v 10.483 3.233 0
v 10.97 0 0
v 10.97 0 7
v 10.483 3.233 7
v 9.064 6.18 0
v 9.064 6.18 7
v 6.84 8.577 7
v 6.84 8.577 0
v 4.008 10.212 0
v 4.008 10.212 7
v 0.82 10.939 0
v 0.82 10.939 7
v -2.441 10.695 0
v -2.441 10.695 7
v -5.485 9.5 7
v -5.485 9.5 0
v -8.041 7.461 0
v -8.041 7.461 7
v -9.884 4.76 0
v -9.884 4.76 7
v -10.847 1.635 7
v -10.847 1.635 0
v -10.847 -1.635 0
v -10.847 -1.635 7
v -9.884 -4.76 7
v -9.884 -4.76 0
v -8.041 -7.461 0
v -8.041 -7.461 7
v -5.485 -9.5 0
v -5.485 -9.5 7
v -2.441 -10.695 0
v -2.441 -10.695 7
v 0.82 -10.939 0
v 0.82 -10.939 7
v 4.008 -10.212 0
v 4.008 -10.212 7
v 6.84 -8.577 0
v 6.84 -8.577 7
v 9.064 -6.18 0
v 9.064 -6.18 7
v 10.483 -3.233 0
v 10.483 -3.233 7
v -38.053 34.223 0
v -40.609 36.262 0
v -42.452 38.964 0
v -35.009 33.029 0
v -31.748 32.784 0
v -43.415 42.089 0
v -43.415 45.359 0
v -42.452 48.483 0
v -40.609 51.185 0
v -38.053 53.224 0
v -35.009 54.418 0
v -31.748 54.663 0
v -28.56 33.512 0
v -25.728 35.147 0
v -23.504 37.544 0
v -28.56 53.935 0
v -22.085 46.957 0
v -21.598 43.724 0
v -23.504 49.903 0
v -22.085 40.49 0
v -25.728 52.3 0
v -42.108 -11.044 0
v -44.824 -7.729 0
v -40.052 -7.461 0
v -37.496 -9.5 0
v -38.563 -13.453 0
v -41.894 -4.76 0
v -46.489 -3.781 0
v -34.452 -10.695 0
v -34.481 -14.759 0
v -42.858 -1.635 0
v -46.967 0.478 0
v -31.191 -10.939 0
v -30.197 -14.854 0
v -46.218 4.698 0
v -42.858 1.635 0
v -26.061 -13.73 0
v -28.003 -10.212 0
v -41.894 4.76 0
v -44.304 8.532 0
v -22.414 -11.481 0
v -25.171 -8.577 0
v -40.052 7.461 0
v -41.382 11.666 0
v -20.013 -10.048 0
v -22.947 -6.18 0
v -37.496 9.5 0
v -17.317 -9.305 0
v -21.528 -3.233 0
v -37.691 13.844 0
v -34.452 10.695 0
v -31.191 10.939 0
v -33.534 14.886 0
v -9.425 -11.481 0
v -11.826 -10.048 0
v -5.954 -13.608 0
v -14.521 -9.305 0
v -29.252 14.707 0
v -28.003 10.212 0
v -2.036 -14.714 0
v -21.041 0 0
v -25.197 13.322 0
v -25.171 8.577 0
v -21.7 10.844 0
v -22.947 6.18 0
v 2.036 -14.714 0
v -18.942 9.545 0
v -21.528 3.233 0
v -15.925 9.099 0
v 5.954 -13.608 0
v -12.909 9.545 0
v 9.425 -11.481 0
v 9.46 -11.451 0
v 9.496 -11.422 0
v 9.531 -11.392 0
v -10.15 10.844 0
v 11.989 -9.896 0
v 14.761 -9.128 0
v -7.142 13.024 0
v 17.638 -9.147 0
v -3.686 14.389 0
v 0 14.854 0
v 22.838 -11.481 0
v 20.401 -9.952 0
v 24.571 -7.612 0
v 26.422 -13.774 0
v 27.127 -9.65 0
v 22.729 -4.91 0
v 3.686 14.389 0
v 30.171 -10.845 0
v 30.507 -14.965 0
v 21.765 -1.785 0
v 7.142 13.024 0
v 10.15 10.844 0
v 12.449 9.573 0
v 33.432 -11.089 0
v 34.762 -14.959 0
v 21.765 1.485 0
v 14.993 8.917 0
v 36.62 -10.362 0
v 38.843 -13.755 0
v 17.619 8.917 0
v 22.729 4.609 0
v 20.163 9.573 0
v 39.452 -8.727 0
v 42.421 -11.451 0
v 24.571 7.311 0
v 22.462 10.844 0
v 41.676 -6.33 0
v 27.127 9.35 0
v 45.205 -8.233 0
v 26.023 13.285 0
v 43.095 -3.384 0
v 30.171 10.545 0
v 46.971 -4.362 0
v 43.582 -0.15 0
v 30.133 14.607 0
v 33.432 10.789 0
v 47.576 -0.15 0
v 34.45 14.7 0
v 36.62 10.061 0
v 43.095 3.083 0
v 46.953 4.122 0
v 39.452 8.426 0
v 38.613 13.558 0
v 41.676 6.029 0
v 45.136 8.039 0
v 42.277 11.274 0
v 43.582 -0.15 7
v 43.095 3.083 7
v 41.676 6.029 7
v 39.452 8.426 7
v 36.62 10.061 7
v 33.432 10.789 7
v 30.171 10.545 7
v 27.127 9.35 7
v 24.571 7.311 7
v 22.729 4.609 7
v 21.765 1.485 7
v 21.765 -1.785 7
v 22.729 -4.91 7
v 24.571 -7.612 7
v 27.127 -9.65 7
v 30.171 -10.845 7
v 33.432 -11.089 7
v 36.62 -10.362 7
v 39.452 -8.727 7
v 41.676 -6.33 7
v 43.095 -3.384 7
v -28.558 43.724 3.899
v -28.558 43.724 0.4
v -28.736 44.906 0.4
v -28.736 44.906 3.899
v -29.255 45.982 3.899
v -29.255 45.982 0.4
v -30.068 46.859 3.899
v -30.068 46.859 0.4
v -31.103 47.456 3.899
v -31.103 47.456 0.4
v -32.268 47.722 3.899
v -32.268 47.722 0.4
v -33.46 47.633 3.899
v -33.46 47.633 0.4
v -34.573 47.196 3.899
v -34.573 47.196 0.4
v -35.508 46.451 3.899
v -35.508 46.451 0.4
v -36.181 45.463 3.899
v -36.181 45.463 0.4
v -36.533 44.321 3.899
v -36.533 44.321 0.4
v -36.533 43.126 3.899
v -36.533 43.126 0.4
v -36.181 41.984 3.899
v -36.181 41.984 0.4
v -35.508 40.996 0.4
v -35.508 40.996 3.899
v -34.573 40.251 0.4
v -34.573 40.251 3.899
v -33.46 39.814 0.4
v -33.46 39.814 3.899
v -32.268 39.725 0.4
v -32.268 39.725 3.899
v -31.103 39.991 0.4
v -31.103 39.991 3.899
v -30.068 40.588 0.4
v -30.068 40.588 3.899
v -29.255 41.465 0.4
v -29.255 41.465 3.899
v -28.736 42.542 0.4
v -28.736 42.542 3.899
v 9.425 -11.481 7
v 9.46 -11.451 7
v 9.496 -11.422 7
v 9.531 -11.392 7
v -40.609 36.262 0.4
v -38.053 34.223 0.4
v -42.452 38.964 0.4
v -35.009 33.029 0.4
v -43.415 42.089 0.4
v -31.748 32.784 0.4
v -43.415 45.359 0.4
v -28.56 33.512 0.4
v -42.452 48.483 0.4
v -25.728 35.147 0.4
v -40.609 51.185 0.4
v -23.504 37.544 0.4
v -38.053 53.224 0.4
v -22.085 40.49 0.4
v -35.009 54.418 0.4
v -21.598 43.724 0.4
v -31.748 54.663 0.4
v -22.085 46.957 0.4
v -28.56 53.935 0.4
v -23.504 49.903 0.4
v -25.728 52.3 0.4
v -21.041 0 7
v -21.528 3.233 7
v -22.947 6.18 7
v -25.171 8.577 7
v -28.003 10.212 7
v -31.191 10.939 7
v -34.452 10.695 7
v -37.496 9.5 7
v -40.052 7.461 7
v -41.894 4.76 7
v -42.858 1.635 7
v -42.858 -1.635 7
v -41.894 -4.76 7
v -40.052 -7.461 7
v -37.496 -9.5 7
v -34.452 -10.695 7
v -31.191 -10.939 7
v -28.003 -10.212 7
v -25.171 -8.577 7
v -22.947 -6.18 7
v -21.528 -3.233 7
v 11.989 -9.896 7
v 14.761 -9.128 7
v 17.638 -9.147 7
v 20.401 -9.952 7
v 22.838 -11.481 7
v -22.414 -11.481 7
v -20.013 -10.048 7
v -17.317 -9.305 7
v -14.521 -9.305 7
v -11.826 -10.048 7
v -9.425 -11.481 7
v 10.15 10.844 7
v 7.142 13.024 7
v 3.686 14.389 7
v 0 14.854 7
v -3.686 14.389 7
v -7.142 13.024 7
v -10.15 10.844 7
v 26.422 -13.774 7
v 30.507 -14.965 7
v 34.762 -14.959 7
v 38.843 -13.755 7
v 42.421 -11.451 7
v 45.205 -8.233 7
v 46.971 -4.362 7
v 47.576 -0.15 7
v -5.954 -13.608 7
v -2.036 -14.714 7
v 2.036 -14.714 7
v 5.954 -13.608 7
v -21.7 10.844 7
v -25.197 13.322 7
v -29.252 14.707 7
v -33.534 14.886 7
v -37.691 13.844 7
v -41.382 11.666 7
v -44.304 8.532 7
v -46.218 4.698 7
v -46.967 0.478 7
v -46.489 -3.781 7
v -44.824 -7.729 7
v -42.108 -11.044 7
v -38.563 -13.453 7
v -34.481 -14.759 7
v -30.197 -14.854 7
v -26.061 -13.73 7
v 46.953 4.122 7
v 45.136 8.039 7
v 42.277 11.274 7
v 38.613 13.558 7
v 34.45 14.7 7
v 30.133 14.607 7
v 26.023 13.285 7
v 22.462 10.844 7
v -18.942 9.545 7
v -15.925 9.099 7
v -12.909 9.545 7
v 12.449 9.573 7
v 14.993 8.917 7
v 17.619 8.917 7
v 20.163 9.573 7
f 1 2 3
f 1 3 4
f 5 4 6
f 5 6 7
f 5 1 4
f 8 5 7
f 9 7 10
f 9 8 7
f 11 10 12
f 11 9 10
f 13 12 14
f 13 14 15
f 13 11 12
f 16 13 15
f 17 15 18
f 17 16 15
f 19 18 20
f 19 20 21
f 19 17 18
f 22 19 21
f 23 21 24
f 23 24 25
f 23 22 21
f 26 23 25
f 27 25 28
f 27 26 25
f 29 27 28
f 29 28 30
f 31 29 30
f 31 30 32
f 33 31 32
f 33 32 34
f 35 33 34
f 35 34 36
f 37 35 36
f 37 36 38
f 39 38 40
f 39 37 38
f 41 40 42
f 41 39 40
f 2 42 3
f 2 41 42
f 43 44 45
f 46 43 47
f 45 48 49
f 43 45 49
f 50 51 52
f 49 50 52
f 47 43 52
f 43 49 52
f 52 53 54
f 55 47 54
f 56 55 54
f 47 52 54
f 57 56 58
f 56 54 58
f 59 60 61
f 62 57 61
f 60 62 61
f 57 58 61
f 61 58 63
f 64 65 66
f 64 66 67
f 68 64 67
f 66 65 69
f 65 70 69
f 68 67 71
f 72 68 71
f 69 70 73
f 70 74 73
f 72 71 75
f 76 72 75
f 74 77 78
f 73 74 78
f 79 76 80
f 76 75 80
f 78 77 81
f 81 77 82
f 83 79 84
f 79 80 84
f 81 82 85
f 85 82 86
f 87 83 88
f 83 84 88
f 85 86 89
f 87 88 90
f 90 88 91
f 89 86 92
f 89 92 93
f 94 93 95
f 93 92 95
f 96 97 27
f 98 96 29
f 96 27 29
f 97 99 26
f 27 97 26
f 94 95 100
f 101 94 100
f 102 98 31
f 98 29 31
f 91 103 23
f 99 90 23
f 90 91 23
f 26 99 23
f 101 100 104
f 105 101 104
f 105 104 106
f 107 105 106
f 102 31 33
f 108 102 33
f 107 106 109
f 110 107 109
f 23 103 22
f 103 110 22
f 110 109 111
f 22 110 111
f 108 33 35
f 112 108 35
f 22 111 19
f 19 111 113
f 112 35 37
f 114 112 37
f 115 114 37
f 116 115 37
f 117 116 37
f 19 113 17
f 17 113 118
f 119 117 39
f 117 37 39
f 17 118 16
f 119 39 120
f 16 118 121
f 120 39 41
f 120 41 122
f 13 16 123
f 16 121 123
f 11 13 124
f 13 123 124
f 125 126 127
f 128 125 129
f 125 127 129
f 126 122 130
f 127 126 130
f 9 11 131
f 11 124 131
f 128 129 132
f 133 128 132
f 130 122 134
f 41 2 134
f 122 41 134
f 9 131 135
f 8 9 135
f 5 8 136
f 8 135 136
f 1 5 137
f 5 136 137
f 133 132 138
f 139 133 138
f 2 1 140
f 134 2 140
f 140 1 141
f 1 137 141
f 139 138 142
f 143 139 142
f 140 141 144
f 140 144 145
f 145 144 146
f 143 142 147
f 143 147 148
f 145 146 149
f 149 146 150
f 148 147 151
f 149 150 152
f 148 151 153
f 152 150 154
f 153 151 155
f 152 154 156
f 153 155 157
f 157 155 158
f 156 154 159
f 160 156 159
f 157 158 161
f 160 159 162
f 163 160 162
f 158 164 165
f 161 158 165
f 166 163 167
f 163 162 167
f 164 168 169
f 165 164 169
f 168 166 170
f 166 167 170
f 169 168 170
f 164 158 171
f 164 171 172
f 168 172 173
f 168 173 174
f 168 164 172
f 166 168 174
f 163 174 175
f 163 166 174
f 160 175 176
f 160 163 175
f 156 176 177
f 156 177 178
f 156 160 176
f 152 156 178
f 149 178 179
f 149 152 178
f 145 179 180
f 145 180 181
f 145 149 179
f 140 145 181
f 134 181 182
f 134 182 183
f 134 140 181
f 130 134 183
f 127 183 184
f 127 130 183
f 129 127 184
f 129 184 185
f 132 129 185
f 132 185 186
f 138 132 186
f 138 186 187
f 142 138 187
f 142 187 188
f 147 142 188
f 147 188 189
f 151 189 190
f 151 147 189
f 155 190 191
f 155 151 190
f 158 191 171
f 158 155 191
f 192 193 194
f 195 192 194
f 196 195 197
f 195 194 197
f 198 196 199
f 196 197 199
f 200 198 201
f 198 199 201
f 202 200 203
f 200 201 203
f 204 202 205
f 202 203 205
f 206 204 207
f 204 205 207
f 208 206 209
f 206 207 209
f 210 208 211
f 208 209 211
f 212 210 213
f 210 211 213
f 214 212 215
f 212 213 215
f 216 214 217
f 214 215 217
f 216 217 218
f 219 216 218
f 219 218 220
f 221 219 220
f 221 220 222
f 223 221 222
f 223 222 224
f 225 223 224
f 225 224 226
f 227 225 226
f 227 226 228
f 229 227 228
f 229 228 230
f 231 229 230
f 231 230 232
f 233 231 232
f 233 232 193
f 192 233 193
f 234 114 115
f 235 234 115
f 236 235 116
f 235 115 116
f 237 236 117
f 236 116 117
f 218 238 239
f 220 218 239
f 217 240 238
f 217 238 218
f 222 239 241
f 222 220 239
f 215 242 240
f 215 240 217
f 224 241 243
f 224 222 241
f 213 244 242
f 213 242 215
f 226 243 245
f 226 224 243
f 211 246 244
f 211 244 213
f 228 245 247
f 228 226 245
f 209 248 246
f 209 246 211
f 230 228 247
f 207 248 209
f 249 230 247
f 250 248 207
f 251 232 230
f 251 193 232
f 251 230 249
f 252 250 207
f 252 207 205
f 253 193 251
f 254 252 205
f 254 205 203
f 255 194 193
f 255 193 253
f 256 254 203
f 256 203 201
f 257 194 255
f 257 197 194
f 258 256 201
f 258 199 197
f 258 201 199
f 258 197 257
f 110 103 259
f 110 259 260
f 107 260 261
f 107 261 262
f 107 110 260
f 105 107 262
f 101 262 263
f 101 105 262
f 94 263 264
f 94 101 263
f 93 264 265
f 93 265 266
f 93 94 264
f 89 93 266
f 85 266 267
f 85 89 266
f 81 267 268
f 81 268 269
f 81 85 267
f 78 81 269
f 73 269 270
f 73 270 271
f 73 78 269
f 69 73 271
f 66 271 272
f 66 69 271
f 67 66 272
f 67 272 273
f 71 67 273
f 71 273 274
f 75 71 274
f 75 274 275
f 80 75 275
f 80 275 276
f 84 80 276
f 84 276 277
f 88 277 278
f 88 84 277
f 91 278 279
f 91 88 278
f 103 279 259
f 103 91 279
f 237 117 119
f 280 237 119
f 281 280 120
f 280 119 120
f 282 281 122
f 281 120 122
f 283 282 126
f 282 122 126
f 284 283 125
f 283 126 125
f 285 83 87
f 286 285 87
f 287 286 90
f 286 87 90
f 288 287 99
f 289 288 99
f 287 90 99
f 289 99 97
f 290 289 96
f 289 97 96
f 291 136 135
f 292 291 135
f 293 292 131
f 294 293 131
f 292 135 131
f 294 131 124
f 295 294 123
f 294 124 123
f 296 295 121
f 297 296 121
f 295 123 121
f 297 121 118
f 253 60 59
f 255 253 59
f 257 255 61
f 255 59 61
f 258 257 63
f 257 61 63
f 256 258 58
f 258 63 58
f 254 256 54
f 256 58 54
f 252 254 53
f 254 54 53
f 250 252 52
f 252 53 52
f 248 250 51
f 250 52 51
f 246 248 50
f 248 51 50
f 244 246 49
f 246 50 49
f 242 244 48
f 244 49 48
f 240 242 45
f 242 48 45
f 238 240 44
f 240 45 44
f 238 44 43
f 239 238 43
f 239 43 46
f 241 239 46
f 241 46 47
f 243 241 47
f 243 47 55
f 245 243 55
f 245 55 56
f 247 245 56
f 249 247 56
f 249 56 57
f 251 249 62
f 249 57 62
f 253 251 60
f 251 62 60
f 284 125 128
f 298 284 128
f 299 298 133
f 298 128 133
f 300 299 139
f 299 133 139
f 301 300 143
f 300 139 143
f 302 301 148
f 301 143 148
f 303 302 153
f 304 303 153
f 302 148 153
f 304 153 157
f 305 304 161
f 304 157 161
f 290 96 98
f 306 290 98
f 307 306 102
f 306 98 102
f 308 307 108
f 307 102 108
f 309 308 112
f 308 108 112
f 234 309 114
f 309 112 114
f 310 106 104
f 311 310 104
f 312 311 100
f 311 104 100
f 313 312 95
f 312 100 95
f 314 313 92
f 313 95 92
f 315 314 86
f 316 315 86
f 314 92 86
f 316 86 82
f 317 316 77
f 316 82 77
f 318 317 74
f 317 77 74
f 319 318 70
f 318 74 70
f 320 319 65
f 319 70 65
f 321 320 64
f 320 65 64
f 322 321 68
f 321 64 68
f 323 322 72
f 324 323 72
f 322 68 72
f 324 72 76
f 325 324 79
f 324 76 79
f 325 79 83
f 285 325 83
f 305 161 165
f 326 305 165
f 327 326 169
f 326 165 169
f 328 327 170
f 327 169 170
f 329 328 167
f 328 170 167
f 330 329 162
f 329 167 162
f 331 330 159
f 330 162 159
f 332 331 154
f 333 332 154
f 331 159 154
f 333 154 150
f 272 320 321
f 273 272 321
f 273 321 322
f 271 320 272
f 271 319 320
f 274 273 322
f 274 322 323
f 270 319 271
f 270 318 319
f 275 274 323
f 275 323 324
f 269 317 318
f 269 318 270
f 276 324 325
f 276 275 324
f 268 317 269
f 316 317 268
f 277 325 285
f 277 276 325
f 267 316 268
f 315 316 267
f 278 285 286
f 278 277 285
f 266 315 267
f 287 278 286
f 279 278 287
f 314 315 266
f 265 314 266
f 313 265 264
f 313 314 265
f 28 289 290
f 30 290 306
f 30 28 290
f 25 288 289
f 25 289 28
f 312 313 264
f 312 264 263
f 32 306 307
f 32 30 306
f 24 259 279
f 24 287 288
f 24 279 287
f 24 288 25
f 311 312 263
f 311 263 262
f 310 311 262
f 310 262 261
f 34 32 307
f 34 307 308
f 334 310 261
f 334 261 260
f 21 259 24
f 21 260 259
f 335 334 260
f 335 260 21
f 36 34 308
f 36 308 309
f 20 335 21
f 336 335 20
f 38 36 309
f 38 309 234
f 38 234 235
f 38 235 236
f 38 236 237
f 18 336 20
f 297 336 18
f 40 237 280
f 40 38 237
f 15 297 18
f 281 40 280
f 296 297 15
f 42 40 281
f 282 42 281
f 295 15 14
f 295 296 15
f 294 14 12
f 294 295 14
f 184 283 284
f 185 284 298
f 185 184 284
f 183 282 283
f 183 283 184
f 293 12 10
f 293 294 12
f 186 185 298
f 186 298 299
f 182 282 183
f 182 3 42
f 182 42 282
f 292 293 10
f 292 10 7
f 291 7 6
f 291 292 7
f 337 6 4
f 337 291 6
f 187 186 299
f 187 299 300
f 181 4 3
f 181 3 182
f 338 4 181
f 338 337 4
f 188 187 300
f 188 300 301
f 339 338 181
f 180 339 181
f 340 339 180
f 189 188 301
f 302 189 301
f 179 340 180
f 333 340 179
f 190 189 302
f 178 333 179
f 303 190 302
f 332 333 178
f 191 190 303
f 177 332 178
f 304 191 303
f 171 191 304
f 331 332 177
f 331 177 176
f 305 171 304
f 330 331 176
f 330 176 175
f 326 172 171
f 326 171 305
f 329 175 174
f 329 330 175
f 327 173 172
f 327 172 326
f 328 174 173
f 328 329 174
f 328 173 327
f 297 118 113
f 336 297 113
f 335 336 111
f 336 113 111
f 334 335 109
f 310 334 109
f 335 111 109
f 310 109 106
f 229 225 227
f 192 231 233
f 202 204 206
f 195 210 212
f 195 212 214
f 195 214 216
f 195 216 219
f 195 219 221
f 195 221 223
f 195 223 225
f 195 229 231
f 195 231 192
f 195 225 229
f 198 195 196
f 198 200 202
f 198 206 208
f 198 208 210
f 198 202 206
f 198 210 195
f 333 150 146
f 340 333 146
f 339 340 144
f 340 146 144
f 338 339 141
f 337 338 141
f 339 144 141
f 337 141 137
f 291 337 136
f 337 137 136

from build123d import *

# Parameters (mm, degrees)
F0_R     = 10.969873
F1_DEPTH = 7
F2_R     = 10.969873
F2_R_2   = 4.009944
F3_DEPTH = 0.4
F4_DEPTH = 3.899


with BuildPart() as f1:
    # F0 (on Top) → F1 (new body)
    with BuildSketch(Plane.XY):
        with BuildLine():
            ThreePointArc((9.531212, -11.392412), (13.457422, -6.287198), (14.853655, 0))
            ThreePointArc((14.853655, 0), (13.62721, 5.910178), (10.150407, 10.844367))
            ThreePointArc((10.150407, 10.844367), (0, 14.853655), (-10.150407, 10.844367))
            ThreePointArc((-10.150407, 10.844367), (-14.845811, -0.482663), (-9.424578, -11.480783))
            ThreePointArc((-9.424578, -11.480783), (0, -14.853655), (9.424578, -11.480783))
            ThreePointArc((9.424578, -11.480783), (9.477749, -11.436421), (9.531212, -11.392412))
        make_face()
        Circle(F0_R, mode=Mode.SUBTRACT)
        with BuildLine():
            ThreePointArc((10.150407, 10.844367), (13.62721, 5.910178), (14.853655, 0))
            ThreePointArc((14.853655, 0), (13.457422, -6.287198), (9.531212, -11.392412))
            ThreePointArc((9.531212, -11.392412), (16.20044, -9.038003), (22.83781, -11.480783))
            ThreePointArc((22.83781, -11.480783), (17.650377, -0.402473), (22.461509, 10.844367))
            ThreePointArc((22.461509, 10.844367), (16.305958, 8.833536), (10.150407, 10.844367))
        make_face()
        with BuildLine():
            ThreePointArc((9.424578, -11.480783), (9.477998, -11.436722), (9.531212, -11.392412))
            ThreePointArc((9.531212, -11.392412), (9.477749, -11.436421), (9.424578, -11.480783))
        make_face()
        with BuildLine():
            ThreePointArc((-9.424578, -11.480783), (-14.845811, -0.482663), (-10.150407, 10.844367))
            ThreePointArc((-10.150407, 10.844367), (-15.925187, 9.09922), (-21.699967, 10.844367))
            ThreePointArc((-21.699967, 10.844367), (-18.259436, 5.900198), (-17.047113, 0))
            ThreePointArc((-17.047113, 0), (-18.454974, -6.336561), (-22.413642, -11.480783))
            ThreePointArc((-22.413642, -11.480783), (-15.91911, -9.211222), (-9.424578, -11.480783))
        make_face()
        with BuildLine():
            ThreePointArc((47.575979, -0.150286), (38.613154, 13.557549), (22.461509, 10.844367))
            ThreePointArc((22.461509, 10.844367), (17.650377, -0.402473), (22.83781, -11.480783))
            ThreePointArc((22.83781, -11.480783), (38.84332, -13.755039), (47.575979, -0.150286))
        make_face()
        with Locations((32.612115, -0.150286)):
            Circle(F0_R, mode=Mode.SUBTRACT)
        with BuildLine():
            ThreePointArc((-17.047113, 0), (-18.259436, 5.900198), (-21.699967, 10.844367))
            ThreePointArc((-21.699967, 10.844367), (-46.9672, 0.47811), (-22.413642, -11.480783))
            ThreePointArc((-22.413642, -11.480783), (-18.454974, -6.336561), (-17.047113, 0))
        make_face()
        with Locations((-32.010976, 0)):
            Circle(F0_R, mode=Mode.SUBTRACT)
    extrude(amount=F1_DEPTH)


with BuildPart() as f3:
    # F2 (on Top) → F3 (new body)
    with BuildSketch(Plane.XY):
        with Locations((-32.568011, 43.723583)):
            Circle(F2_R)
        with Locations((-32.568011, 43.723583)):
            Circle(F2_R_2, mode=Mode.SUBTRACT)
    extrude(amount=F3_DEPTH)

    # F2 (on Top) → F4 (join)
    with BuildSketch(Plane.XY):
        with Locations((-32.568011, 43.723583)):
            Circle(F2_R_2)
    extrude(amount=F4_DEPTH)


solid = Compound([f1.part, f3.part])
